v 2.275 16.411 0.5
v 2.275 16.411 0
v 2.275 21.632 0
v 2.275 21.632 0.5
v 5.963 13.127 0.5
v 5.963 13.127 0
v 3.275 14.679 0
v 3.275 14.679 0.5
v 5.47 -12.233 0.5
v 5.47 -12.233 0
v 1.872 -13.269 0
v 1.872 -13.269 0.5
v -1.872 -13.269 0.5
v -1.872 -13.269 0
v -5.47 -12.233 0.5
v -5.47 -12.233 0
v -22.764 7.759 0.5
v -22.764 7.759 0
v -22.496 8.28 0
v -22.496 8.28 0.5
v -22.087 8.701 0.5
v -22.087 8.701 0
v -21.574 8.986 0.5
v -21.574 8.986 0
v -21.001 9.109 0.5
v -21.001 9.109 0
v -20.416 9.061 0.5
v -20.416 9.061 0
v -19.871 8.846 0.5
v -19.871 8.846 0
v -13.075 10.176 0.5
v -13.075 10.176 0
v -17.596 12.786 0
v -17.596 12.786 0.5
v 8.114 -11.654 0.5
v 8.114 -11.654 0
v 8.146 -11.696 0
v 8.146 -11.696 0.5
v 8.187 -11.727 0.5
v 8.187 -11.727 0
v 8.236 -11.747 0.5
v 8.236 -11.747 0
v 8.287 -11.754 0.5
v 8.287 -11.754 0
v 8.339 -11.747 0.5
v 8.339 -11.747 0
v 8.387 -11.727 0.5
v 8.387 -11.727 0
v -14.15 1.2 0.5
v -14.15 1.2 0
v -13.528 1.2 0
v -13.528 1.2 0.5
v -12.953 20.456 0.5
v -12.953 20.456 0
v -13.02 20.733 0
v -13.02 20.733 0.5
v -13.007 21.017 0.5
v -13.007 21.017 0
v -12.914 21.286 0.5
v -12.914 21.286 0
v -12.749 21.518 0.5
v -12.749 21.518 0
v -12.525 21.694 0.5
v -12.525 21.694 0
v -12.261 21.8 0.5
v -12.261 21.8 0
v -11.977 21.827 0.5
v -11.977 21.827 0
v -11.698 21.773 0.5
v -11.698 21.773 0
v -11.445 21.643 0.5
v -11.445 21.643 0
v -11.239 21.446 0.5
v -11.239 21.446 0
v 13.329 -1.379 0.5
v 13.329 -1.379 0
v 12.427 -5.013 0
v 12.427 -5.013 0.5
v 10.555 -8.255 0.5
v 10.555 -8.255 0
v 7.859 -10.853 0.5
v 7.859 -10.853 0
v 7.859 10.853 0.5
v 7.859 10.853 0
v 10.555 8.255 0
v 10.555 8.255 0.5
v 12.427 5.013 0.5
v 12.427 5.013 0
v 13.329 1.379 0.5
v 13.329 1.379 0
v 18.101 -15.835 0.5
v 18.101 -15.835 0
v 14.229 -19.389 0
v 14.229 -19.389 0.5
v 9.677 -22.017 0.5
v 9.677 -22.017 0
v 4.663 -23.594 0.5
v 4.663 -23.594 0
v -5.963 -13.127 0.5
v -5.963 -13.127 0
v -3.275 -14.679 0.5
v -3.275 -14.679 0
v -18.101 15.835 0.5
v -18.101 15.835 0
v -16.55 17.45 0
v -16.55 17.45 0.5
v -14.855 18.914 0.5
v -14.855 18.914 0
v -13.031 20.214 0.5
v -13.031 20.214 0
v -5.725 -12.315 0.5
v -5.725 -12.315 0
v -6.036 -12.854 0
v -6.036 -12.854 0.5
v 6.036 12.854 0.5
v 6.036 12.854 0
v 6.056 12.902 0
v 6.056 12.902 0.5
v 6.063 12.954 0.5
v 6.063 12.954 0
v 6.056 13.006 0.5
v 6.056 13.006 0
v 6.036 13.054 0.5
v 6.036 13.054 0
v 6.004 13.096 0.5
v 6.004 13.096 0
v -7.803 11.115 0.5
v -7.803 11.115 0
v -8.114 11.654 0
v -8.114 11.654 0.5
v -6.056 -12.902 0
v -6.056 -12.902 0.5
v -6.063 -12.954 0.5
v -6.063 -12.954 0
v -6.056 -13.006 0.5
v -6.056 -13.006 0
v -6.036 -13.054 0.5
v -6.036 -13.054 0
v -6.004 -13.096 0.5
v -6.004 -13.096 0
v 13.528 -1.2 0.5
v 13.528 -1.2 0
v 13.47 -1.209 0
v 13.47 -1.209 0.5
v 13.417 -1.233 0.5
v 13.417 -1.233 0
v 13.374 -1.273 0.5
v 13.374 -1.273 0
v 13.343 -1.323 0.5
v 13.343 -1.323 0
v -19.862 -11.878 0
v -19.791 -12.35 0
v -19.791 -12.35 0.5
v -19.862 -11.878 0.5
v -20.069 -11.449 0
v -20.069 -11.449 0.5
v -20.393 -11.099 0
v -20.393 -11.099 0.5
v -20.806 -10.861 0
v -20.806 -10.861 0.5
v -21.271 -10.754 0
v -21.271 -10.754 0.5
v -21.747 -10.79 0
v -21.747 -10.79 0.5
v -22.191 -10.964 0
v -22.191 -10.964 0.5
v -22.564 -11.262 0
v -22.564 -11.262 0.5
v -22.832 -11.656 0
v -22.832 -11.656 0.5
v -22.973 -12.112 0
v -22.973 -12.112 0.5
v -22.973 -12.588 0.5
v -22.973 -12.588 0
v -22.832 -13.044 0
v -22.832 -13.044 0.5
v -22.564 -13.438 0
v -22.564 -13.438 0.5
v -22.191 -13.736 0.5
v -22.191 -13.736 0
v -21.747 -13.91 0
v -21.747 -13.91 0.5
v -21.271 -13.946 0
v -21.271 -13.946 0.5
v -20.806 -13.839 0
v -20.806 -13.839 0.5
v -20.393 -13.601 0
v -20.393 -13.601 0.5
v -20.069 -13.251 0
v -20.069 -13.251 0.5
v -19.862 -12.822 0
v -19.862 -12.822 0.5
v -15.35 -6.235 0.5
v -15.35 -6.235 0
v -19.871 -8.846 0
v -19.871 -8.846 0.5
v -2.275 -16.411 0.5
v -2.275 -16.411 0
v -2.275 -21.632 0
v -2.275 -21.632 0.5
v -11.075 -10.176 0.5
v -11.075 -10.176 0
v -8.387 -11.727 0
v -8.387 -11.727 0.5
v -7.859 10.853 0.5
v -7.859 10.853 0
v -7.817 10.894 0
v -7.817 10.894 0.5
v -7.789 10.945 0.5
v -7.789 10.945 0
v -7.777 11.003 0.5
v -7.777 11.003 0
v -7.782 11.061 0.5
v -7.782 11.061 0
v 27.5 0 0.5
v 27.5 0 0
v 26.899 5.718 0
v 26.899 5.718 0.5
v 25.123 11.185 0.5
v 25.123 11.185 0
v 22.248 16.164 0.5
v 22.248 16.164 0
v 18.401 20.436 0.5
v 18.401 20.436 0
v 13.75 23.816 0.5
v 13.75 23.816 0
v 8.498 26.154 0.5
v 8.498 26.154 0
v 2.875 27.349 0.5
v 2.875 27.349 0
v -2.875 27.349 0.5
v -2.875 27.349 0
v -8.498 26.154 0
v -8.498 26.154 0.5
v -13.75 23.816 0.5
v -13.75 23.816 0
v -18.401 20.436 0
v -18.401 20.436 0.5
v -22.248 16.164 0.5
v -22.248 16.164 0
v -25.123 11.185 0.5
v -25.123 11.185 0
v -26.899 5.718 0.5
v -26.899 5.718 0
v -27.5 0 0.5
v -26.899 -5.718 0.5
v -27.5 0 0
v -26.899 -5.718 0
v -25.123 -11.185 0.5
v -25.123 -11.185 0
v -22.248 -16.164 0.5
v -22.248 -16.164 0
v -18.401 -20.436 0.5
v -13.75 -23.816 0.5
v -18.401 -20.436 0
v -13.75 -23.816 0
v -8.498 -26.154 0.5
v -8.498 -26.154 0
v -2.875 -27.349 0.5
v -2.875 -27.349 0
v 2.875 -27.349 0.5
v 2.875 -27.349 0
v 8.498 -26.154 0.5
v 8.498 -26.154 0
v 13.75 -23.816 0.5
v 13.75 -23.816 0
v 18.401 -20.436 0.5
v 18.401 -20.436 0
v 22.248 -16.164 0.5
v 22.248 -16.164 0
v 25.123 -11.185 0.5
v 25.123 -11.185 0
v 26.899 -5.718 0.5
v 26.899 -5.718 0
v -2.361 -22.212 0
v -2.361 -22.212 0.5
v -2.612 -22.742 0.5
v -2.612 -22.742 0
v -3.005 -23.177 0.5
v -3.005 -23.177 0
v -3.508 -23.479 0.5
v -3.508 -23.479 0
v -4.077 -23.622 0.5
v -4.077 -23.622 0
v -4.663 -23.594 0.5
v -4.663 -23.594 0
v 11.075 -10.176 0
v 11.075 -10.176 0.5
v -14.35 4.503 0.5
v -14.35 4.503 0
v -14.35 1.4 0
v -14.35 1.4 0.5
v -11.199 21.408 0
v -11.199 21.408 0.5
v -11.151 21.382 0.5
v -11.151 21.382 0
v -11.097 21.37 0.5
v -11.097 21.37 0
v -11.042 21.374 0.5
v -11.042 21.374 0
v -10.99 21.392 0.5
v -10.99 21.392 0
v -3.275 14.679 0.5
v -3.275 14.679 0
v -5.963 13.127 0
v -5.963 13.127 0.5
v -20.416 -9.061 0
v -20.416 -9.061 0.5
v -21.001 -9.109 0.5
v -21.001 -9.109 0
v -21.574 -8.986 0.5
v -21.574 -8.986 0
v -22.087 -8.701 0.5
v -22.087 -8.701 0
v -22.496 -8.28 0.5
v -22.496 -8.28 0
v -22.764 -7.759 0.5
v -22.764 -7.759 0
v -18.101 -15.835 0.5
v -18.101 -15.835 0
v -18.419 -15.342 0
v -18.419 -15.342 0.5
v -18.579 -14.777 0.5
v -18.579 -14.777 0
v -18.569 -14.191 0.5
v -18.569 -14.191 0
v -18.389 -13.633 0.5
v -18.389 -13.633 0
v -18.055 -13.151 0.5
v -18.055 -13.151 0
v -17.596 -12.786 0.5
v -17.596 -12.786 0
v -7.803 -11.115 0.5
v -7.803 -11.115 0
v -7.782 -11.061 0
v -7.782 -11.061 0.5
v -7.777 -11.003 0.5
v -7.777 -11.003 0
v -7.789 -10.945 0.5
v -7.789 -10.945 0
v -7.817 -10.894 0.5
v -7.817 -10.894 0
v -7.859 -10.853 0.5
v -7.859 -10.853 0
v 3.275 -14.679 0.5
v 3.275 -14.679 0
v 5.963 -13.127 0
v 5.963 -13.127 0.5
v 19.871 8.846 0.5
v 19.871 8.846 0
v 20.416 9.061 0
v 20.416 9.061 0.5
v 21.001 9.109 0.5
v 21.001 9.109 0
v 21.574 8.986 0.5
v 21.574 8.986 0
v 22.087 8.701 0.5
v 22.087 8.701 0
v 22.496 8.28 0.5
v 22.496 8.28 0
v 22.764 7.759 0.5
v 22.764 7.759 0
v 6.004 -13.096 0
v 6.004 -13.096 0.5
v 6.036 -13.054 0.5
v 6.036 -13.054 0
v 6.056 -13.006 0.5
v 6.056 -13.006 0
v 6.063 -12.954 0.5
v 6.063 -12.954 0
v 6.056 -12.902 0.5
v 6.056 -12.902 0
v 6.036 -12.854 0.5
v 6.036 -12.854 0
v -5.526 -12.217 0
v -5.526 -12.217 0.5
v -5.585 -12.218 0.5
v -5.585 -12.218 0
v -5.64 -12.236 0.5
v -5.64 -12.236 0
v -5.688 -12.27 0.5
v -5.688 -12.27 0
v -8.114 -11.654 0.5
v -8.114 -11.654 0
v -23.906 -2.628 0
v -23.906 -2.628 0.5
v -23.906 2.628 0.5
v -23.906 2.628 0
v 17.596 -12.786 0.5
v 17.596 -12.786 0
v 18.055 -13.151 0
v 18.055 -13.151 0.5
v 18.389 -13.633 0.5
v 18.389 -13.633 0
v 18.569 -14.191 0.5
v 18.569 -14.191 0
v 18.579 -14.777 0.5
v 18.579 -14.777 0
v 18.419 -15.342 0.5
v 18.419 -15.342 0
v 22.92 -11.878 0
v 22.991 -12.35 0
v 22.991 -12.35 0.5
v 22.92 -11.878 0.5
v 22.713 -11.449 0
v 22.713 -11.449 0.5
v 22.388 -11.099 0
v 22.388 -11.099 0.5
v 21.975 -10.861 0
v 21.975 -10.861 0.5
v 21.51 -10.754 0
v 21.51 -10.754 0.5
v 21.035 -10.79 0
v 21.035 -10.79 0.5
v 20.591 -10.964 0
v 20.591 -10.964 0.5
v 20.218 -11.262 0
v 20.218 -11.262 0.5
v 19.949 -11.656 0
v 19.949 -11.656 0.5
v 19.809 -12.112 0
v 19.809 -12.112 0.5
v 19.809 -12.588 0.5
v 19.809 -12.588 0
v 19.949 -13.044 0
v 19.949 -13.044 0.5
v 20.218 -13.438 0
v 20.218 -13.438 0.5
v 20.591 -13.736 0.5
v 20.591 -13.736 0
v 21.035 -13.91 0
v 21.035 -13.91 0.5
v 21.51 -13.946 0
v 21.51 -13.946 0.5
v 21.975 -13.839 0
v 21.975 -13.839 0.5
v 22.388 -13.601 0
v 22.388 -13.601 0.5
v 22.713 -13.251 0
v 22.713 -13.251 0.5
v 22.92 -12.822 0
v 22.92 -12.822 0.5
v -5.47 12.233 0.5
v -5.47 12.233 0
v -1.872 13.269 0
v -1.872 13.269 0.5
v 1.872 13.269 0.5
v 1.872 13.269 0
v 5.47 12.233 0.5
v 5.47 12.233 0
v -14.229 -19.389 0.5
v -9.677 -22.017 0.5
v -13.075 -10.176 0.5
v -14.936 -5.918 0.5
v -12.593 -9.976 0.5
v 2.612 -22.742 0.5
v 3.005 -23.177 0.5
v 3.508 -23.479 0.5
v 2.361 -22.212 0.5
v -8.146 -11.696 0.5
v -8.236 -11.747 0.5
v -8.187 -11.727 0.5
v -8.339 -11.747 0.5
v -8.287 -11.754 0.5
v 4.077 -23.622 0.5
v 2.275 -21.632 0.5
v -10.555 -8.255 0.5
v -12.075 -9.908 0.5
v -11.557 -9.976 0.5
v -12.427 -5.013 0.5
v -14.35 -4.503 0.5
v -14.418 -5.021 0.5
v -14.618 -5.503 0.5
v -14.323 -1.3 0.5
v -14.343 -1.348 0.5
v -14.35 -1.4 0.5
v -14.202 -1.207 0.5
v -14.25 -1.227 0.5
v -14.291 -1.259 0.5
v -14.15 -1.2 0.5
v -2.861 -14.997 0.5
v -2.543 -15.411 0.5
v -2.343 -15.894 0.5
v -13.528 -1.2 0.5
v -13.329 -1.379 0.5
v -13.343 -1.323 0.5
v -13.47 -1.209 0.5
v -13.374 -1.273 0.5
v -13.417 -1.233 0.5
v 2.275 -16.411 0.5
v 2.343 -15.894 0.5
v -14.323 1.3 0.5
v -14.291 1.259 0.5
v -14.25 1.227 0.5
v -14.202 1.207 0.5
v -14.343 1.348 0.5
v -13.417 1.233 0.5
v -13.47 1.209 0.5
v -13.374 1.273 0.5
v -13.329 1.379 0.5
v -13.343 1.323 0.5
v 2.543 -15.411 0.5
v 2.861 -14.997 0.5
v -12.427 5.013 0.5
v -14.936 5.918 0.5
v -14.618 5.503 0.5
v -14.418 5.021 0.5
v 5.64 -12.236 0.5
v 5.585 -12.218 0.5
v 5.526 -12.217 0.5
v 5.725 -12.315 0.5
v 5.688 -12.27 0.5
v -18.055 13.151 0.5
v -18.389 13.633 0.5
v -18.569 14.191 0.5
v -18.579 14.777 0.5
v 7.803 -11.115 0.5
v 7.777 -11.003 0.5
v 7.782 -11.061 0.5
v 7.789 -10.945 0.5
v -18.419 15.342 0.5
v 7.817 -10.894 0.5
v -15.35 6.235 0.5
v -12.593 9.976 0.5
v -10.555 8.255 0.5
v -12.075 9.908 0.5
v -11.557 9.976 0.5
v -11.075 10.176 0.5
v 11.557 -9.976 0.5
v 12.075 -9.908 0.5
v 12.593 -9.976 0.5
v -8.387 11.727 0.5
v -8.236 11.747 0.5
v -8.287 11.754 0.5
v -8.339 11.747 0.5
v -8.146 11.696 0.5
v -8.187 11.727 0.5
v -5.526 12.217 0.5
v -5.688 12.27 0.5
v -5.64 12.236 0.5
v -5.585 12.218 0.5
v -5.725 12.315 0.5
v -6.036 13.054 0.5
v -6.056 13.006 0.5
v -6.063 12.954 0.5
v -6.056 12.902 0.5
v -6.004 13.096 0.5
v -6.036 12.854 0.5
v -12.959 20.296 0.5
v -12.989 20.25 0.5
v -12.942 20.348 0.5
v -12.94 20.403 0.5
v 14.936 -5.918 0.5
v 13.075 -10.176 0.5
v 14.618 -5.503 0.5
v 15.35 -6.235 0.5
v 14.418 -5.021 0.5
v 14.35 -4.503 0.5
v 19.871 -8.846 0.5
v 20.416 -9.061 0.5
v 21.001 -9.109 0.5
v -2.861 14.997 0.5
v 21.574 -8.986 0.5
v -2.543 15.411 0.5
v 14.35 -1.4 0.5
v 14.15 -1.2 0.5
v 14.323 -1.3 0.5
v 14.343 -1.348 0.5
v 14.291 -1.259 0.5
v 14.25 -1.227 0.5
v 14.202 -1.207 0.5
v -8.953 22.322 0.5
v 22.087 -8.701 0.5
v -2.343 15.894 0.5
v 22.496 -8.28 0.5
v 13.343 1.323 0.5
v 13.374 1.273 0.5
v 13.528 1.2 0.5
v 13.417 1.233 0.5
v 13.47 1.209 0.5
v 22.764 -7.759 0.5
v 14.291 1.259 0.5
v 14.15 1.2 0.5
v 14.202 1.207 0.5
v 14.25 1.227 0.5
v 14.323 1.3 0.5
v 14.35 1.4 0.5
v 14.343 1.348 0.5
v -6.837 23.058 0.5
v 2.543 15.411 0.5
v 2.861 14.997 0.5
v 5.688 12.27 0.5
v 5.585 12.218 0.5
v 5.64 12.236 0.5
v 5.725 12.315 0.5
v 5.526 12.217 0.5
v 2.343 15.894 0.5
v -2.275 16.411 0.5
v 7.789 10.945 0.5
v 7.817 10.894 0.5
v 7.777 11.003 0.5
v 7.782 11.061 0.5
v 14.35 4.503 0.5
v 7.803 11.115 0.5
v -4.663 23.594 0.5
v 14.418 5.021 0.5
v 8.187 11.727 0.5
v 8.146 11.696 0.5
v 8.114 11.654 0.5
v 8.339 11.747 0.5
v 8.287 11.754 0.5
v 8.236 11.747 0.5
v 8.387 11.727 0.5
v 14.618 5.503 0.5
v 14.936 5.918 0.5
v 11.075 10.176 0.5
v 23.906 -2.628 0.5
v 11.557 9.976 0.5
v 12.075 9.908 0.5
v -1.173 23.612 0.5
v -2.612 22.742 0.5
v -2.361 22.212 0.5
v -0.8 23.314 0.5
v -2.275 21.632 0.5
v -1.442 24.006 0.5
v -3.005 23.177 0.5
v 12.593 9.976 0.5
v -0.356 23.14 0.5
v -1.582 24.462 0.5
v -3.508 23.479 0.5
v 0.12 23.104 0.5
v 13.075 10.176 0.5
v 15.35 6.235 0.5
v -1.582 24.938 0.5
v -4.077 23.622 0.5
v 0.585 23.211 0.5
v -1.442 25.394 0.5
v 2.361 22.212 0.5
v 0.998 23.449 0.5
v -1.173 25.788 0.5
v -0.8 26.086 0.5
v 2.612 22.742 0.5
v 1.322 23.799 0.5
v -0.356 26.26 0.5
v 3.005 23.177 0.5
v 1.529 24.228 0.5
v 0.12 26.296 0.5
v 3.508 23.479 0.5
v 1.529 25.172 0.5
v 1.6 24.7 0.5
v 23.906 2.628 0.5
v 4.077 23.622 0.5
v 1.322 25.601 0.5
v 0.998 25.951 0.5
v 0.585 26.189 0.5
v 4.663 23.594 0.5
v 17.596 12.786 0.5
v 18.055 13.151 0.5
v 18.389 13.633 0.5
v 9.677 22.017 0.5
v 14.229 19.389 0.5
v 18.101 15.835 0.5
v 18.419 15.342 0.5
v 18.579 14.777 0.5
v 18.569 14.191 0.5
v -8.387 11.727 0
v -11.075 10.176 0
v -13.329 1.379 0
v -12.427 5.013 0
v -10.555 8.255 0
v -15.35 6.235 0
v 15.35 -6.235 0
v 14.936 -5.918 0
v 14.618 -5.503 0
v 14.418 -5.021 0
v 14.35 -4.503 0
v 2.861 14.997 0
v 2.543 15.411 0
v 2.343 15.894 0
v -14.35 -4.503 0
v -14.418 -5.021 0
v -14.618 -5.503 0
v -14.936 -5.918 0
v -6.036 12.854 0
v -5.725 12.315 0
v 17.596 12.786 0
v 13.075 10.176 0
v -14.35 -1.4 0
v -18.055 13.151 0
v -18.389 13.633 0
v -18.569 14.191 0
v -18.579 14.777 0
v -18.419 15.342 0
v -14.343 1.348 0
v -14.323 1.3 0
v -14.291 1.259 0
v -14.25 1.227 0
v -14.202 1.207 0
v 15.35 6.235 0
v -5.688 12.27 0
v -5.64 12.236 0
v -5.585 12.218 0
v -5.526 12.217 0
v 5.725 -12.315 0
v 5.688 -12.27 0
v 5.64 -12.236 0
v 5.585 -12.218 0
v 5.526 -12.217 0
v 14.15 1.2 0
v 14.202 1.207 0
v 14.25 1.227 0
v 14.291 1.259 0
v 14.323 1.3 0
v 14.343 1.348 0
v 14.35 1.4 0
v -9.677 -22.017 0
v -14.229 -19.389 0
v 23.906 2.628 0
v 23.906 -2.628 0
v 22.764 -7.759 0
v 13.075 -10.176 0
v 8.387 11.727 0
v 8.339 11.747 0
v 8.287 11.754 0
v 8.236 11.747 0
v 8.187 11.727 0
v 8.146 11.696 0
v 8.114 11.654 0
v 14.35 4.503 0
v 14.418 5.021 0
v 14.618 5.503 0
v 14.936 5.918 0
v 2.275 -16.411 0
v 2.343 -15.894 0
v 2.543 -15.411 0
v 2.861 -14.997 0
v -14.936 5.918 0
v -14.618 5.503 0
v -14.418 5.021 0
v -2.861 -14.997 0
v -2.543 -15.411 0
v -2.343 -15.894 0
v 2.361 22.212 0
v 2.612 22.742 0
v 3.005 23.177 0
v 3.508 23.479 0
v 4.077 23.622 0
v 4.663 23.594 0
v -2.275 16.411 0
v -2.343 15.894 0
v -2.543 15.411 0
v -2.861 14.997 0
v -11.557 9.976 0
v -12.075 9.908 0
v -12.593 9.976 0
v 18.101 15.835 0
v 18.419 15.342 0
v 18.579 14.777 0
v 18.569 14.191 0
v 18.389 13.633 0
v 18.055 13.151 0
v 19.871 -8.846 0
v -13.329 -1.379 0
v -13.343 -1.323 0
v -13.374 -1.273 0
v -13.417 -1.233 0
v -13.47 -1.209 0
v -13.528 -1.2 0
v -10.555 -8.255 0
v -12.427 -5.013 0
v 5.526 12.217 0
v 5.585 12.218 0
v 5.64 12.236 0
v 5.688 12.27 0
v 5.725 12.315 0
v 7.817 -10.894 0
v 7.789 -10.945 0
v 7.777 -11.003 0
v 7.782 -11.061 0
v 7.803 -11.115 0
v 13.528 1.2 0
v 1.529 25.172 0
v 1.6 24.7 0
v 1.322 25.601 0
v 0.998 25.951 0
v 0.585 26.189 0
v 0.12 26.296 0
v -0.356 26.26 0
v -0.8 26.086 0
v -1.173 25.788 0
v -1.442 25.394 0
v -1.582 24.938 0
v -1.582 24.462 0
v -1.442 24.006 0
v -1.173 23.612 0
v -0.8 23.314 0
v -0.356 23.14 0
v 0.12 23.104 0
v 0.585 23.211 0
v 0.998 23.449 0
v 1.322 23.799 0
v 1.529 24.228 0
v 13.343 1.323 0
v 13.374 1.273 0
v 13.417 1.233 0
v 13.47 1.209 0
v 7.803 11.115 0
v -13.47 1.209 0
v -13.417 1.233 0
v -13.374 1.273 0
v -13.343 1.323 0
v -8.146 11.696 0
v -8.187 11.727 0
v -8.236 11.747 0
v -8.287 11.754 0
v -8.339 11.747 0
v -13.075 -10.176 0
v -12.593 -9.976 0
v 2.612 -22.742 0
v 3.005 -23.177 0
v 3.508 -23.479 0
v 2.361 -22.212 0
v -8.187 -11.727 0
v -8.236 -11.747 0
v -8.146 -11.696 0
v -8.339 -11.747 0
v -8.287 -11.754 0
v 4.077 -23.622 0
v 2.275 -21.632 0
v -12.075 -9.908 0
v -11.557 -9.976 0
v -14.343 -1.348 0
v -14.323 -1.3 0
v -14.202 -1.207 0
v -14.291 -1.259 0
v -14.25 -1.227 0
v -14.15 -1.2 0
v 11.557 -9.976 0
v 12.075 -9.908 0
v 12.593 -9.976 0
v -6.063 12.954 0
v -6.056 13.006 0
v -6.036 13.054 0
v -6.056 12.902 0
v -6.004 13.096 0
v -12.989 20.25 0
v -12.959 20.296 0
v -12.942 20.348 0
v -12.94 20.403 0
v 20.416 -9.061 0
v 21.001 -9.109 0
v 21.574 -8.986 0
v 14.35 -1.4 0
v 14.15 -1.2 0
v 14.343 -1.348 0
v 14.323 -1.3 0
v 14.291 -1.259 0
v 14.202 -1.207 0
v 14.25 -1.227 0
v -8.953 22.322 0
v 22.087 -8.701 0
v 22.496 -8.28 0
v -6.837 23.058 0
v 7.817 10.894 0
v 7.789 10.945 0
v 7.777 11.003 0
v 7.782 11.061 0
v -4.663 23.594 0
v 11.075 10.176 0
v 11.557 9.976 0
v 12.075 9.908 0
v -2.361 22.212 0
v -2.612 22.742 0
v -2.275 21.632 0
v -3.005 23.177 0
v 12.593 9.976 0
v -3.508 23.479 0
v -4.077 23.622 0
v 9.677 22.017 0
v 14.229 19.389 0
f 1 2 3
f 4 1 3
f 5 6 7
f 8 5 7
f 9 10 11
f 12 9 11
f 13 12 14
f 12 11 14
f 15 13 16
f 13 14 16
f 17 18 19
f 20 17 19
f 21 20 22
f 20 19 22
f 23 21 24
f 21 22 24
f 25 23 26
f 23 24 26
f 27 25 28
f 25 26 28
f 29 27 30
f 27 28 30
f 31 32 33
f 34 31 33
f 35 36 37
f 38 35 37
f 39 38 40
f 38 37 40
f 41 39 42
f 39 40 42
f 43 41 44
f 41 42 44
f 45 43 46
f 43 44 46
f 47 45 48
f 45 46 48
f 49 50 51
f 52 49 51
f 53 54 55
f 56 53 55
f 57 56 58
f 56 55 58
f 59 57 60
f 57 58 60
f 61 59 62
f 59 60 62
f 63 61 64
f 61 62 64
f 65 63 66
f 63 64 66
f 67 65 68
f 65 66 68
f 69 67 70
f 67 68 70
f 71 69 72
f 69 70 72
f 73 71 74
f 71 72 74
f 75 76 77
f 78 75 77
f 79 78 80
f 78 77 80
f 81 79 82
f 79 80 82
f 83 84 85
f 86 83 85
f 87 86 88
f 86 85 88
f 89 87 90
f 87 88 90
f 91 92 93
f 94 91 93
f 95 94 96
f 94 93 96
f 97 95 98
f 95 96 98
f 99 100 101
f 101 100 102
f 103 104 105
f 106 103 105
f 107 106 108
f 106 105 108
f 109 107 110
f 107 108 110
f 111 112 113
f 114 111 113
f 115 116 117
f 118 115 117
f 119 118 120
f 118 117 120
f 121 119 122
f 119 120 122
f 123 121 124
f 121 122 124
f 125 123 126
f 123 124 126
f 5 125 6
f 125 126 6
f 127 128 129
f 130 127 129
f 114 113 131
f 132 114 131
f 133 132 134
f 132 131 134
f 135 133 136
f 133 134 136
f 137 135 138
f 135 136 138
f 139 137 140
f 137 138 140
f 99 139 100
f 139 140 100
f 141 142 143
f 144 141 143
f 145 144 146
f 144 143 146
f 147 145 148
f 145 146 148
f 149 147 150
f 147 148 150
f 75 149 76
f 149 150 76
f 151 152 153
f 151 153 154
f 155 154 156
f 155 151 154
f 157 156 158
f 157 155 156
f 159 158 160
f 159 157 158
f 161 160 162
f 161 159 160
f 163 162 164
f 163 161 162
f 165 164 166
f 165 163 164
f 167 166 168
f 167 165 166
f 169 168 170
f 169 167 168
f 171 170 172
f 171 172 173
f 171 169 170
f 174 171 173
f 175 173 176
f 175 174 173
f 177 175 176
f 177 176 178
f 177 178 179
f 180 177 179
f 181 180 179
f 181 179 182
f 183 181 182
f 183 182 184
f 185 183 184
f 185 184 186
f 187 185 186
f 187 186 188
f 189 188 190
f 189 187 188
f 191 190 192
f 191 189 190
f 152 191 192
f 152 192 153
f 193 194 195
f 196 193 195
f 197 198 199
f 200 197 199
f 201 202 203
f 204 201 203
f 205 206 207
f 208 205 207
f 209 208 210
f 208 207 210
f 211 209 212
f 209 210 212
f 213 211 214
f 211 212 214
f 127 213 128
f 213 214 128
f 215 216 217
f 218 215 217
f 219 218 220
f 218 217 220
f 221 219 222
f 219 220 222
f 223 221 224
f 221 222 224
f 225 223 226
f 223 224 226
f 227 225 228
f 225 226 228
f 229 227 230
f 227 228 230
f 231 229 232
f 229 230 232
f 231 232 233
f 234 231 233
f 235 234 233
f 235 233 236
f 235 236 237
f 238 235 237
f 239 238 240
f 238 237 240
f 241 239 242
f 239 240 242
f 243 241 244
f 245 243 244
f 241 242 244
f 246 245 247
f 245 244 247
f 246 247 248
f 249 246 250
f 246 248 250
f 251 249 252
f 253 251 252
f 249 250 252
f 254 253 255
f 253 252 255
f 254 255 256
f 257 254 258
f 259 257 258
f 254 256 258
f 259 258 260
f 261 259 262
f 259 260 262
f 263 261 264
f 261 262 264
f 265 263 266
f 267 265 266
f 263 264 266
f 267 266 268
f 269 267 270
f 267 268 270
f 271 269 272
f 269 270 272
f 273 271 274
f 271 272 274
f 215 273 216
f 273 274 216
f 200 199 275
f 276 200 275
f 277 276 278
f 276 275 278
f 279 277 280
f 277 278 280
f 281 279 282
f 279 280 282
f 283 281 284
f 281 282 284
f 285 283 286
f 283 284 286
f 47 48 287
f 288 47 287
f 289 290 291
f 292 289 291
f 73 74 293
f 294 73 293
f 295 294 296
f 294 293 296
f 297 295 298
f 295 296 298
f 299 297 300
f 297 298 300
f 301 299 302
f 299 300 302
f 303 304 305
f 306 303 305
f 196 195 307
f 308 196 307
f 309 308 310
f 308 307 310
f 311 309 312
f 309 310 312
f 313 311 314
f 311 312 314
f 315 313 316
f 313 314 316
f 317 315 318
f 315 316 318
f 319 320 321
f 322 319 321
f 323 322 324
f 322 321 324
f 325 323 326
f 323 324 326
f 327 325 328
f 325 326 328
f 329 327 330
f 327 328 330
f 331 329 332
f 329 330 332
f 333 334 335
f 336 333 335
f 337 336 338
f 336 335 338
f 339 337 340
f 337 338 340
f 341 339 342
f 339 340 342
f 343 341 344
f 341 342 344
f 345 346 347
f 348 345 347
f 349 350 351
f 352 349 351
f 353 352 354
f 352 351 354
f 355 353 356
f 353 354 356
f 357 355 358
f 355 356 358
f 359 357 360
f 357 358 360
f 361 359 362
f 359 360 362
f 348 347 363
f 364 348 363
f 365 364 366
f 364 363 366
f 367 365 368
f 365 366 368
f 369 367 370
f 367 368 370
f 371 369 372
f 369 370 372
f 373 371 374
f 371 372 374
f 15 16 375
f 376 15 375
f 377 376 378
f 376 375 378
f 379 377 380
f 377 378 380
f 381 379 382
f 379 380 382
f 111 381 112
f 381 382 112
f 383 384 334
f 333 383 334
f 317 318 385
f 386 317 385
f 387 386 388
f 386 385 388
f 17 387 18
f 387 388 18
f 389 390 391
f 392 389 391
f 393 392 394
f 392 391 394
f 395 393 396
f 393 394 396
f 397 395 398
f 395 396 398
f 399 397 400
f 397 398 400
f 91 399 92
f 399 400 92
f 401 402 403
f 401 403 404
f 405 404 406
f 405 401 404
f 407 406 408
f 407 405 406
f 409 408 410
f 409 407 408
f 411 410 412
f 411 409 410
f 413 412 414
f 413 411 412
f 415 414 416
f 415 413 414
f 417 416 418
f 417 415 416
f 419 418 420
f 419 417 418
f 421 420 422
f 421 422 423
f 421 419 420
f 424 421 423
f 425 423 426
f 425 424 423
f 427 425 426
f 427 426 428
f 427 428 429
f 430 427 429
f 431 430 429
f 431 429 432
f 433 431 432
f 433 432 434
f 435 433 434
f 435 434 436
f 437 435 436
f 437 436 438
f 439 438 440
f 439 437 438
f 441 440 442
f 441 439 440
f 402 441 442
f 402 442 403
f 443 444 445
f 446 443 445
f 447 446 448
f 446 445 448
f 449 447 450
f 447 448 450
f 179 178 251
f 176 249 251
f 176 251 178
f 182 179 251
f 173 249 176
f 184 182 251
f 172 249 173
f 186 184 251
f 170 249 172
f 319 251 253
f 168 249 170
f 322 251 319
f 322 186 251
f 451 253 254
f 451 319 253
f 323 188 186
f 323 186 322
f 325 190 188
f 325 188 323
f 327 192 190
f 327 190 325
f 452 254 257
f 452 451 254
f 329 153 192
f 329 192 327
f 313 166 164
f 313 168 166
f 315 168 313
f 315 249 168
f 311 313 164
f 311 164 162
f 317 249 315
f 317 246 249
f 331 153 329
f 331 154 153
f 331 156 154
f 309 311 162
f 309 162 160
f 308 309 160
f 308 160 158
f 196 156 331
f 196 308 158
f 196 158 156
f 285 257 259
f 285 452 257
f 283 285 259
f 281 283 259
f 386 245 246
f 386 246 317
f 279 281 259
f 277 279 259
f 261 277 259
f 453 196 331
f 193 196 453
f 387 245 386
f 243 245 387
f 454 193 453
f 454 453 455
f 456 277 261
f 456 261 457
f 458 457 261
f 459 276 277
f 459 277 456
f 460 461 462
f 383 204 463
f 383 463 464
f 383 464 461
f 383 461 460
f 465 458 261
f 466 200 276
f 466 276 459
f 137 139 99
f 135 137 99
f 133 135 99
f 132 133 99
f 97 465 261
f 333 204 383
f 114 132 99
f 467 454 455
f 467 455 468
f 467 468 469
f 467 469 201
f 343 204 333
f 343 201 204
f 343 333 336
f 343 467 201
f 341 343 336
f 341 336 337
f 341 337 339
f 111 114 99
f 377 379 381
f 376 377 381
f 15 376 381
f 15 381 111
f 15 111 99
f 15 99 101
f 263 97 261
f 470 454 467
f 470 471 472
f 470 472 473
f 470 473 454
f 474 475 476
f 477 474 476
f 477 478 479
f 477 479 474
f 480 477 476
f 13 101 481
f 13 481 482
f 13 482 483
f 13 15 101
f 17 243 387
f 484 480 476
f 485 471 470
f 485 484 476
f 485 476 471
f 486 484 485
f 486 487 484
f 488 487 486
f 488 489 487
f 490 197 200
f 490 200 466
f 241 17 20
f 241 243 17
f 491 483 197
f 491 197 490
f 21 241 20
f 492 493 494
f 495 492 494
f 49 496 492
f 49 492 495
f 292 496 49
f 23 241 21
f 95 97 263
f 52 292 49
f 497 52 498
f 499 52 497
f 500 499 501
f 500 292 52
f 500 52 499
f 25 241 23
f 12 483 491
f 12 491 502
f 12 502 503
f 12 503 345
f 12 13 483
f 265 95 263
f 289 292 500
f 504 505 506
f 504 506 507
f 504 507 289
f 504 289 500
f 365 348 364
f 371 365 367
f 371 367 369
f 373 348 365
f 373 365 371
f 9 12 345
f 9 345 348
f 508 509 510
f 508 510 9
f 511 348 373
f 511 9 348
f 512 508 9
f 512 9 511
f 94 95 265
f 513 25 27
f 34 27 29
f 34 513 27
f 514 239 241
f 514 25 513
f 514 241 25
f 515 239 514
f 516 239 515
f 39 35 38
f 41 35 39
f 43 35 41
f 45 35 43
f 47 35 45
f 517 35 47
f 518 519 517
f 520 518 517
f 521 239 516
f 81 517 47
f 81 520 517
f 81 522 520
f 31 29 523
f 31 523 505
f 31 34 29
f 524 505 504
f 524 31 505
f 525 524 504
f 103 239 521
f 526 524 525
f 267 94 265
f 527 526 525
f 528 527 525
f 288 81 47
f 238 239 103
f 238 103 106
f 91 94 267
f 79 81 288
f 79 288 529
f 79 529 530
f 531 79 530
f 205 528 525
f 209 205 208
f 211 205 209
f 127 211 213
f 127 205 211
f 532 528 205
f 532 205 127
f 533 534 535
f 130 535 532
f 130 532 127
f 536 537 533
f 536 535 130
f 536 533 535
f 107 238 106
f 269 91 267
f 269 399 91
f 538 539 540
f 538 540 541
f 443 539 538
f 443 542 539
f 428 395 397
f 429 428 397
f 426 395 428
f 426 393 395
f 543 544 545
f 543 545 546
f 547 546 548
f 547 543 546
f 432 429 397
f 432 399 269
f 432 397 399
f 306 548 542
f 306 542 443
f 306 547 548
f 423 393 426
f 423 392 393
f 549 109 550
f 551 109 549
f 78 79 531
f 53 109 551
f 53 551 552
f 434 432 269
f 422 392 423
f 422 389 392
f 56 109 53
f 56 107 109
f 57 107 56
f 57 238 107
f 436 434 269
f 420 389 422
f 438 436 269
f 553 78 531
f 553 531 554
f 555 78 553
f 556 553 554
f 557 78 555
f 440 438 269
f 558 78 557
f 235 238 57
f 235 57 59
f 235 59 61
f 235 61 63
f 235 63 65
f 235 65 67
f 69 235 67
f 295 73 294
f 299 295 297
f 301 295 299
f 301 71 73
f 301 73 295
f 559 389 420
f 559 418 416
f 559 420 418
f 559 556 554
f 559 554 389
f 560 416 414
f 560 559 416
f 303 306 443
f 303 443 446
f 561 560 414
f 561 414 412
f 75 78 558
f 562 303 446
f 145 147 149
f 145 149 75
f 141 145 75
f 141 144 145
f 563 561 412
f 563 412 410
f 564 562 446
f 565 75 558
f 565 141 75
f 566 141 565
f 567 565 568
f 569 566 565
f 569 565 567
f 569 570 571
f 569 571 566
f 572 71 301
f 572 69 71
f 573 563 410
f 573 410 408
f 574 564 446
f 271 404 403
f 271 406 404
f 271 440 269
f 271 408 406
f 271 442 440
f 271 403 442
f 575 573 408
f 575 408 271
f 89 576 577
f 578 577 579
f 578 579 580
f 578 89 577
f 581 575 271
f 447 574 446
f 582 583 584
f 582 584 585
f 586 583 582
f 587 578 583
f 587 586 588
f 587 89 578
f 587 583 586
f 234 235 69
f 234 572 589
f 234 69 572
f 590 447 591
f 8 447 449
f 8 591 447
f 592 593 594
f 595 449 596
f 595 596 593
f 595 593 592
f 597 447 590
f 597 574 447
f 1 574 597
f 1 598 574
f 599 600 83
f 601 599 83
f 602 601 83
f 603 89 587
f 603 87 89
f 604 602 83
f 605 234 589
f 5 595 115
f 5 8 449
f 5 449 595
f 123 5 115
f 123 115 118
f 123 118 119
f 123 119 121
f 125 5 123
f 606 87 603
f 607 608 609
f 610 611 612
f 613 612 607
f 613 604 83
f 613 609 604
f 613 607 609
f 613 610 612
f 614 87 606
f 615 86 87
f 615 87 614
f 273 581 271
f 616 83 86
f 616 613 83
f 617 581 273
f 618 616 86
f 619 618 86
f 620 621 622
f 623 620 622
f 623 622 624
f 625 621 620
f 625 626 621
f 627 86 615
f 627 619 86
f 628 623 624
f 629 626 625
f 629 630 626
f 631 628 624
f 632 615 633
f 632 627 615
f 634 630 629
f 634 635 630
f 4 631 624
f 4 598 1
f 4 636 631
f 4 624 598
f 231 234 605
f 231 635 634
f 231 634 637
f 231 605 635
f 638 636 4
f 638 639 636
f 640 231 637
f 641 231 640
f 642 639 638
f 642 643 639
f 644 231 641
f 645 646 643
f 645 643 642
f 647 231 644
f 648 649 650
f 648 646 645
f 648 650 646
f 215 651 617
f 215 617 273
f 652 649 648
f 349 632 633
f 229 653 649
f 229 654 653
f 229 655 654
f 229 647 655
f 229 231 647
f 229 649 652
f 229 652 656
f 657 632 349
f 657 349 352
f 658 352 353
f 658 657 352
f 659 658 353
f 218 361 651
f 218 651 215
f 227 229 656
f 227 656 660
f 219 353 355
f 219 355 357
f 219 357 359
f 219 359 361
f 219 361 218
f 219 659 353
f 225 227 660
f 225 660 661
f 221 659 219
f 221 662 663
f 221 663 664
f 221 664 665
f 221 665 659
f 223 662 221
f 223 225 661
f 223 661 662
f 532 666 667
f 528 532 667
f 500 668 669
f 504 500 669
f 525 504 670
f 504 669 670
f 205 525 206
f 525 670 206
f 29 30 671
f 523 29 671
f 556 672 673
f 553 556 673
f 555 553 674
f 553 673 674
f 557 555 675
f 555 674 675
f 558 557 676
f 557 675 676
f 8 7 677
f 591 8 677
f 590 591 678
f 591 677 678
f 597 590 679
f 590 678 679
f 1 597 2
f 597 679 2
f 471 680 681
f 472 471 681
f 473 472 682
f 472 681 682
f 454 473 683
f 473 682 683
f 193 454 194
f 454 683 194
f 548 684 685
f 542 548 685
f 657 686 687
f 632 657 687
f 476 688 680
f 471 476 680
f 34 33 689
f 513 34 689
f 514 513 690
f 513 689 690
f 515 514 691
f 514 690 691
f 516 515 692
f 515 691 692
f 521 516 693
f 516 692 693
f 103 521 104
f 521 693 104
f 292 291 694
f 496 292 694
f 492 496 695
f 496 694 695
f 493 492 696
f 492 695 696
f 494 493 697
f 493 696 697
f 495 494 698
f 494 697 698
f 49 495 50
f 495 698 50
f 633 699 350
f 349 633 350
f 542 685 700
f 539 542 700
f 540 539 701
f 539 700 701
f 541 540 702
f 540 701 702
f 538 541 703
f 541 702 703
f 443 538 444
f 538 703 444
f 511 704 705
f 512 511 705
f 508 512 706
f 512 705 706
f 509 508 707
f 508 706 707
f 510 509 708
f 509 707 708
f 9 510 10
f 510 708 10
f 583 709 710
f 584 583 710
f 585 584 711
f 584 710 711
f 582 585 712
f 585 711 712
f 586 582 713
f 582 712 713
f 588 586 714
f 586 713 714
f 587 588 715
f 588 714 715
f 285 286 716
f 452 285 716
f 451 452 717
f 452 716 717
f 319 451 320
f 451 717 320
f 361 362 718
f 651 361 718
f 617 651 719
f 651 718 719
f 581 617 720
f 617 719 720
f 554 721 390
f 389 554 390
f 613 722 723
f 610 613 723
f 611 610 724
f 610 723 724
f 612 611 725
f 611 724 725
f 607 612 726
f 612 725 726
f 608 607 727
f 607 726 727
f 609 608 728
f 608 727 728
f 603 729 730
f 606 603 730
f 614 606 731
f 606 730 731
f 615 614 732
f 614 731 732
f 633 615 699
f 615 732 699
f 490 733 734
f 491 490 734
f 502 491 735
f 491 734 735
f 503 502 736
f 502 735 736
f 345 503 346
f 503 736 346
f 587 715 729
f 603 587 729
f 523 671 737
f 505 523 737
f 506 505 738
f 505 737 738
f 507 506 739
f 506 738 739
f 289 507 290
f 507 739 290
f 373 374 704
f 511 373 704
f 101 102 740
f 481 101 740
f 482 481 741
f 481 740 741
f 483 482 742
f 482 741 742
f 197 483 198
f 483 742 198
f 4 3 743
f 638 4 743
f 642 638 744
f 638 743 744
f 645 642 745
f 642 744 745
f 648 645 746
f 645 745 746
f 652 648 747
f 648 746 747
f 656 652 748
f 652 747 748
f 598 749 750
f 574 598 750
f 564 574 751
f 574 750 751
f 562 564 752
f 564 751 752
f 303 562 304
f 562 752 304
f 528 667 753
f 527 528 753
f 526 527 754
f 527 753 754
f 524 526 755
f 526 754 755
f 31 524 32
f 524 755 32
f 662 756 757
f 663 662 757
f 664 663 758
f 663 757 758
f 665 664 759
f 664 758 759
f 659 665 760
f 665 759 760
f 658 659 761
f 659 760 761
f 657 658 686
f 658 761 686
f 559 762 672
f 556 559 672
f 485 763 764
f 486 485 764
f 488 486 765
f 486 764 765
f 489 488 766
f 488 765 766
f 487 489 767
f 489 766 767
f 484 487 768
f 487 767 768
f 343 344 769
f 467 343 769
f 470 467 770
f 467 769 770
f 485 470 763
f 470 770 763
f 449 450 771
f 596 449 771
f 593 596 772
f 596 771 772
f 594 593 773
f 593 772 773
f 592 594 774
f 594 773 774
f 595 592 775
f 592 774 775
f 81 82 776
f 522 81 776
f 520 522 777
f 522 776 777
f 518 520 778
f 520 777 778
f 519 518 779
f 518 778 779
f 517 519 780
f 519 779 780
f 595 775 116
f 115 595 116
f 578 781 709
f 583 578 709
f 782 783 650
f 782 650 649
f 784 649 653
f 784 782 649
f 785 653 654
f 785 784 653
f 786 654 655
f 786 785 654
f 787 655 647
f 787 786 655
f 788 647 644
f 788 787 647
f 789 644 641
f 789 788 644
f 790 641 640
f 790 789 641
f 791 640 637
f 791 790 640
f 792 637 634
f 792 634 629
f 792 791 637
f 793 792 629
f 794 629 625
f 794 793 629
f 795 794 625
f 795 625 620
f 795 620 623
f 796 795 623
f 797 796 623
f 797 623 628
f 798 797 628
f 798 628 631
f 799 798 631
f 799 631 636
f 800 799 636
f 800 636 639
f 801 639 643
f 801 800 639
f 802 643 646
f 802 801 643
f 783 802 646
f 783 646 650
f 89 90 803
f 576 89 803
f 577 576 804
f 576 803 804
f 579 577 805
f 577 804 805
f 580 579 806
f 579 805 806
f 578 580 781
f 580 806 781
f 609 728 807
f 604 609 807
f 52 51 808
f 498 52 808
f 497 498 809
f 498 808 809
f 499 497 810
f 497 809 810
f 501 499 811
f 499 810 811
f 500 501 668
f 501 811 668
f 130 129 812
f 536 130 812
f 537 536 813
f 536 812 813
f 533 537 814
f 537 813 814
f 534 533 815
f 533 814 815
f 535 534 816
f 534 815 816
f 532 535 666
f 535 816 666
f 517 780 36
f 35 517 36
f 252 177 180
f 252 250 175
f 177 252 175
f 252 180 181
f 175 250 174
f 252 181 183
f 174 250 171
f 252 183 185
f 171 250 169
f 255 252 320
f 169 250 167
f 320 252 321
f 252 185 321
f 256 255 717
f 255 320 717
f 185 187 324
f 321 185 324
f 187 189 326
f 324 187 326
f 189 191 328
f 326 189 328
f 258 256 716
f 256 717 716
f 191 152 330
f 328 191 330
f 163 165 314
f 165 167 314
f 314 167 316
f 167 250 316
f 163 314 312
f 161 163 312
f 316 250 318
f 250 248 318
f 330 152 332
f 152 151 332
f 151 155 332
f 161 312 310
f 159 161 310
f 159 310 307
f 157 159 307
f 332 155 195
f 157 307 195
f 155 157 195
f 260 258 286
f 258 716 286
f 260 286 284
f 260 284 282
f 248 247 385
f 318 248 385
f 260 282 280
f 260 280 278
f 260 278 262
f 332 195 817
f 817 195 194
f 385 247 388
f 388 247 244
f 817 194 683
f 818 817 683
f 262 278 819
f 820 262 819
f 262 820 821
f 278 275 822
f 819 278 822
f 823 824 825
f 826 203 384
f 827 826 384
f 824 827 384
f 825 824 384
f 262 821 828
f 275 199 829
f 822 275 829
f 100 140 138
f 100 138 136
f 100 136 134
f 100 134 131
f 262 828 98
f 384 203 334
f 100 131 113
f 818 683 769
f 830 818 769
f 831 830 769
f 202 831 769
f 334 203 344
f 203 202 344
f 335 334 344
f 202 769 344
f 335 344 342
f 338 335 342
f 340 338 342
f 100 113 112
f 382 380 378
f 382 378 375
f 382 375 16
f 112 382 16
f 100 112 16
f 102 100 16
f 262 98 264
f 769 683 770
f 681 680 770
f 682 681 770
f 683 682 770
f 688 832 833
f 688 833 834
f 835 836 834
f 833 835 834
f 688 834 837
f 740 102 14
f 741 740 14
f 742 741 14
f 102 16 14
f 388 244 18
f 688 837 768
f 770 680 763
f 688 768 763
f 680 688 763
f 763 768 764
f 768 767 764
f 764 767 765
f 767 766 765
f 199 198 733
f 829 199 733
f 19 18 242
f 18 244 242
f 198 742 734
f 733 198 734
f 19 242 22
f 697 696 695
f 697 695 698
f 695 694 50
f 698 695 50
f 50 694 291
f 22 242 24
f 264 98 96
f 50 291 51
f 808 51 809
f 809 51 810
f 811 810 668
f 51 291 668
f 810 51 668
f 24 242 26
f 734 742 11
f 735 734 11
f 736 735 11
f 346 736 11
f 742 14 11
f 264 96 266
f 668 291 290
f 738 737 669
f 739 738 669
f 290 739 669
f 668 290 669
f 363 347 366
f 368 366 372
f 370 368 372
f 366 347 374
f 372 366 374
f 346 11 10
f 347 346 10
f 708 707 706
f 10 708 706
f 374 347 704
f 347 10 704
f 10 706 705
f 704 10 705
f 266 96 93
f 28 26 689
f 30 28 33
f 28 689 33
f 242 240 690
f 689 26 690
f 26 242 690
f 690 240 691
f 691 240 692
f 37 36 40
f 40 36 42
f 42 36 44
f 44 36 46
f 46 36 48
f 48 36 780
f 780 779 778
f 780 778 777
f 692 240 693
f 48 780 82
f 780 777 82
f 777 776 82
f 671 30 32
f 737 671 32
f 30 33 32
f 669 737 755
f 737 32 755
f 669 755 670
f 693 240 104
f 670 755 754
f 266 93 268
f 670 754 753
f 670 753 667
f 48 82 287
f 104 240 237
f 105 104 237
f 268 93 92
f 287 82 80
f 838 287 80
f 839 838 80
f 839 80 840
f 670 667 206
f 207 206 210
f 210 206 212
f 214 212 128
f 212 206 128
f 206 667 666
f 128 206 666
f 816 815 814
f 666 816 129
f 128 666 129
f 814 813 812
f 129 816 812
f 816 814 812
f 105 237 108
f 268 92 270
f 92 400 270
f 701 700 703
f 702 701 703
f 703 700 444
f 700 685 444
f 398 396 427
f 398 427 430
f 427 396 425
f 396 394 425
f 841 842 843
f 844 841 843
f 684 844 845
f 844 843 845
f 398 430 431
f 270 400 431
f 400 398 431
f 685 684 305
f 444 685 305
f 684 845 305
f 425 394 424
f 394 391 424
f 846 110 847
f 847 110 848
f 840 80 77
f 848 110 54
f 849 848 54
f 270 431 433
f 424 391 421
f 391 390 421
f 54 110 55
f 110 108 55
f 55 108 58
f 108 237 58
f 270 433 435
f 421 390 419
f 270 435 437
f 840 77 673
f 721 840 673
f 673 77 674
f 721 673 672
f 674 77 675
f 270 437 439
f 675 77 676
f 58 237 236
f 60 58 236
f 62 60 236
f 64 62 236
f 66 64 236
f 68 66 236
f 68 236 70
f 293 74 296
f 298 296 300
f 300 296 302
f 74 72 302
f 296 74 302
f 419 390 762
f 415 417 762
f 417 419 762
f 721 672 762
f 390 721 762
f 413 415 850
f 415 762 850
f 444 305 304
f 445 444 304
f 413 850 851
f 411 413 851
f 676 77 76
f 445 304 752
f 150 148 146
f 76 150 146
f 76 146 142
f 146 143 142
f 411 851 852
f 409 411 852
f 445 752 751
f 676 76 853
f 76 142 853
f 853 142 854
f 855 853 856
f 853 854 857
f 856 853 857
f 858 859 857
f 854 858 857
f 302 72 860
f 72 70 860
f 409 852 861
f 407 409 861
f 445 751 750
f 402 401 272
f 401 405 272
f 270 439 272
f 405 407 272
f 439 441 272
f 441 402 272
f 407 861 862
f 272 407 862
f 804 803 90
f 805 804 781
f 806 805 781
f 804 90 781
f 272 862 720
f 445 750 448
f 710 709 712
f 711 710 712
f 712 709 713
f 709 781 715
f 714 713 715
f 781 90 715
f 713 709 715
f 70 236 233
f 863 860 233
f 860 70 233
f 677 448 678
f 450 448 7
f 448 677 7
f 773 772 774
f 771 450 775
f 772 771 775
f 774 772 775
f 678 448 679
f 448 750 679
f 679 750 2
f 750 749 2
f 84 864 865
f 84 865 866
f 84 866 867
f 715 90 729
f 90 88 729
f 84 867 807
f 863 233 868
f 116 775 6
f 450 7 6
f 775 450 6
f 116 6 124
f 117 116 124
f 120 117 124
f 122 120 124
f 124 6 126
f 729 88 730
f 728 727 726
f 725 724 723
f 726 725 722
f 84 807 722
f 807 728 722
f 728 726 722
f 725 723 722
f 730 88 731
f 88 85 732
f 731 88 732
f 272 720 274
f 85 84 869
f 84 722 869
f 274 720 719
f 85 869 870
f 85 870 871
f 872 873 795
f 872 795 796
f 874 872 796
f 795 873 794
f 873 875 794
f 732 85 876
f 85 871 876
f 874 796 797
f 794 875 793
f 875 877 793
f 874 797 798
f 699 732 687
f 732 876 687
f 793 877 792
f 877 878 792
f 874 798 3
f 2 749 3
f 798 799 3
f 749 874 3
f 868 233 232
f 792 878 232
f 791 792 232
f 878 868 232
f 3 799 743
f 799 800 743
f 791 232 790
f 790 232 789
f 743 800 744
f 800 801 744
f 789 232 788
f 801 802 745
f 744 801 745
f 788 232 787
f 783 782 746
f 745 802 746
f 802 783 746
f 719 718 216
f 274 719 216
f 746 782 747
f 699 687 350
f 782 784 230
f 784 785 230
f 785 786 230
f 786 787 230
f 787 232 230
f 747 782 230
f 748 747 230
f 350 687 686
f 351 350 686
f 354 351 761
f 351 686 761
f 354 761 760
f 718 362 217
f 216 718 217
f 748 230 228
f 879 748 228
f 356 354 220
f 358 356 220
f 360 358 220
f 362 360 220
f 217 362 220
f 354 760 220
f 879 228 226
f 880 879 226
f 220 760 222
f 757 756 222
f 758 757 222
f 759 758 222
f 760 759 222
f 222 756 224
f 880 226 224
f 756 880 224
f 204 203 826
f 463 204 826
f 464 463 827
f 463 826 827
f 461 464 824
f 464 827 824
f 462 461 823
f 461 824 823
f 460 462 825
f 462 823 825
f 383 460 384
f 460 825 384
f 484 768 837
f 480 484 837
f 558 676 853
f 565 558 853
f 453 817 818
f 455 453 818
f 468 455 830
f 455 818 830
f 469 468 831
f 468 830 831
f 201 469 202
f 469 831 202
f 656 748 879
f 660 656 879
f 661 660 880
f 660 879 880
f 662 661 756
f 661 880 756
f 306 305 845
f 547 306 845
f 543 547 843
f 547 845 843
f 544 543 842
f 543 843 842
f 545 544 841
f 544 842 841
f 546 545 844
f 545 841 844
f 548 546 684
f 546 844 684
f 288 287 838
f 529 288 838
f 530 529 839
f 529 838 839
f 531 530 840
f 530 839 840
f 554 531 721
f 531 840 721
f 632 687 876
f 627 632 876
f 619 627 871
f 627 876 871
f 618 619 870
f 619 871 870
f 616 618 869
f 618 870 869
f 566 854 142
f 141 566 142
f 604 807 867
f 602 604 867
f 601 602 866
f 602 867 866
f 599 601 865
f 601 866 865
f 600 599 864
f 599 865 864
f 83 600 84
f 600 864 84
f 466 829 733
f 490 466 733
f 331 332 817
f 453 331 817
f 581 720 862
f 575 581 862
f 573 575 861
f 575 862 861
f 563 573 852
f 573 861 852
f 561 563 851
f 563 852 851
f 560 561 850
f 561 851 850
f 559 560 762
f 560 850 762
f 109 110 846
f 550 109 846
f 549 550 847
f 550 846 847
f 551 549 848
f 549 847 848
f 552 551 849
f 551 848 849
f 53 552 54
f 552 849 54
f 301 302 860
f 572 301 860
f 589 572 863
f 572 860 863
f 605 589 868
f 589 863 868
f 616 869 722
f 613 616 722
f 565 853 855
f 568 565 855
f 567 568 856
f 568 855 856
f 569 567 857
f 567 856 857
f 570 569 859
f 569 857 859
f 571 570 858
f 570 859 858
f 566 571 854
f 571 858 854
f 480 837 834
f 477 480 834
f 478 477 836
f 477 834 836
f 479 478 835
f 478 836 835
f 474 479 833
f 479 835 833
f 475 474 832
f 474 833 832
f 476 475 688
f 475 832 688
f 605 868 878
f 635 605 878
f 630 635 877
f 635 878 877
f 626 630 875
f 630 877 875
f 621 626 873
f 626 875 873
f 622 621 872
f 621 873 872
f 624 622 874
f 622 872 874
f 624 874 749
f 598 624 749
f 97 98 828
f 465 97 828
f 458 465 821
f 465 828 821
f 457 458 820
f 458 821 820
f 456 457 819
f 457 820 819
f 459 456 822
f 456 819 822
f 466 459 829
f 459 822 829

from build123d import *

# Parameters (mm, degrees)
IZIM1_R                     = 27.5
IZIM1_R_2                   = 1.6
Y_KSEKLIK_EKSTR_ZYON1_DEPTH = 0.5


with BuildPart() as part:
    # Çizim1 → Yükseklik-Ekstrüzyon1 (new body)
    with BuildSketch(Plane.XY):
        Circle(IZIM1_R)
        with Locations((0, 24.7)):
            Circle(IZIM1_R_2, mode=Mode.SUBTRACT)
        with Locations((21.390827473, -12.35)):
            Circle(IZIM1_R_2, mode=Mode.SUBTRACT)
        with Locations((-21.390827473, -12.35)):
            Circle(IZIM1_R_2, mode=Mode.SUBTRACT)
        with BuildLine():
            Line((5.962564435, 13.127464544), (3.275, 14.679130594))
            ThreePointArc((3.275, 14.679130594), (2.542949192, 15.411181402), (2.275, 16.411181402))
            Line((2.275, 16.411181402), (2.275, 21.631617485))
            ThreePointArc((2.275, 21.631617485), (3.00525794, 23.176853746), (4.662755102, 23.593668957))
            ThreePointArc((4.662755102, 23.593668957), (12.025, 20.827910961), (18.101339134, 15.834898849))
            ThreePointArc((18.101339134, 15.834898849), (18.569115153, 14.191056594), (17.596030267, 12.786016536))
            Line((17.596030267, 12.786016536), (13.075, 10.175798494))
            ThreePointArc((13.075, 10.175798494), (12.075, 9.907849302), (11.075, 10.175798494))
            Line((11.075, 10.175798494), (8.387435565, 11.727464544))
            ThreePointArc((8.387435565, 11.727464544), (8.235671756, 11.747444629), (8.114230485, 11.654259464))
            Line((8.114230485, 11.654259464), (7.803105114, 11.115374514))
            ThreePointArc((7.803105114, 11.115374514), (7.780713917, 10.973636087), (7.859011515, 10.853383712))
            ThreePointArc((7.859011515, 10.853383712), (11.604740669, 6.699999553), (13.328811876, 1.379410738))
            ThreePointArc((13.328811876, 1.379410738), (13.393804684, 1.251476831), (13.527749366, 1.199998958))
            Line((13.527749366, 1.199998958), (14.15, 1.199998958))
            ThreePointArc((14.15, 1.199998958), (14.291421356, 1.258577601), (14.35, 1.399998958))
            Line((14.35, 1.399998958), (14.35, 4.5033321))
            ThreePointArc((14.35, 4.5033321), (14.617949192, 5.5033321), (15.35, 6.235382907))
            Line((15.35, 6.235382907), (19.871030267, 8.845600949))
            ThreePointArc((19.871030267, 8.845600949), (21.574373094, 8.985797151), (22.764094236, 7.758770109))
            ThreePointArc((22.764094236, 7.758770109), (24.05, 0), (22.764094236, -7.758770109))
            ThreePointArc((22.764094236, -7.758770109), (21.574373094, -8.985797151), (19.871030267, -8.845600949))
            Line((19.871030267, -8.845600949), (15.35, -6.235382907))
            ThreePointArc((15.35, -6.235382907), (14.617949192, -5.5033321), (14.35, -4.5033321))
            Line((14.35, -4.5033321), (14.35, -1.400001042))
            ThreePointArc((14.35, -1.400001042), (14.291421356, -1.258579686), (14.15, -1.200001042))
            Line((14.15, -1.200001042), (13.527749151, -1.200001042))
            ThreePointArc((13.527749151, -1.200001042), (13.393804479, -1.251478906), (13.328811663, -1.379412792))
            ThreePointArc((13.328811663, -1.379412792), (11.604739636, -6.700001341), (7.859009843, -10.853384923))
            ThreePointArc((7.859009843, -10.853384923), (7.780712223, -10.973637301), (7.803103416, -11.115375743))
            Line((7.803103416, -11.115375743), (8.114228679, -11.654260506))
            ThreePointArc((8.114228679, -11.654260506), (8.235669951, -11.747445671), (8.38743376, -11.727465587))
            Line((8.38743376, -11.727465587), (11.075, -10.175798494))
            ThreePointArc((11.075, -10.175798494), (12.075, -9.907849302), (13.075, -10.175798494))
            Line((13.075, -10.175798494), (17.596030267, -12.786016536))
            ThreePointArc((17.596030267, -12.786016536), (18.569115153, -14.191056594), (18.101339134, -15.834898849))
            ThreePointArc((18.101339134, -15.834898849), (12.025, -20.827910961), (4.662755102, -23.593668957))
            ThreePointArc((4.662755102, -23.593668957), (3.00525794, -23.176853746), (2.275, -21.631617485))
            Line((2.275, -21.631617485), (2.275, -16.411181402))
            ThreePointArc((2.275, -16.411181402), (2.542949192, -15.411181402), (3.275, -14.679130594))
            Line((3.275, -14.679130594), (5.962562629, -13.127465587))
            ThreePointArc((5.962562629, -13.127465587), (6.055747795, -13.006024315), (6.03576771, -12.854260506))
            Line((6.03576771, -12.854260506), (5.724642232, -12.315375369))
            ThreePointArc((5.724642232, -12.315375369), (5.613088766, -12.225114815), (5.469798369, -12.23279632))
            ThreePointArc((5.469798369, -12.23279632), (-2.065e-06, -13.4), (-5.469802139, -12.232794634))
            ThreePointArc((-5.469802139, -12.232794634), (-5.613092563, -12.225113095), (-5.724646058, -12.315373658))
            Line((-5.724646058, -12.315373658), (-6.035771321, -12.854258421))
            ThreePointArc((-6.035771321, -12.854258421), (-6.055751405, -13.00602223), (-5.96256624, -13.127463502))
            Line((-5.96256624, -13.127463502), (-3.275, -14.679130594))
            ThreePointArc((-3.275, -14.679130594), (-2.542949192, -15.411181402), (-2.275, -16.411181402))
            Line((-2.275, -16.411181402), (-2.275, -21.631617485))
            ThreePointArc((-2.275, -21.631617485), (-3.00525794, -23.176853746), (-4.662755102, -23.593668957))
            ThreePointArc((-4.662755102, -23.593668957), (-12.025, -20.827910961), (-18.101339134, -15.834898849))
            ThreePointArc((-18.101339134, -15.834898849), (-18.569115153, -14.191056594), (-17.596030267, -12.786016536))
            Line((-17.596030267, -12.786016536), (-13.075, -10.175798494))
            ThreePointArc((-13.075, -10.175798494), (-12.075, -9.907849302), (-11.075, -10.175798494))
            Line((-11.075, -10.175798494), (-8.387437371, -11.727463502))
            ThreePointArc((-8.387437371, -11.727463502), (-8.235673562, -11.747443587), (-8.11423229, -11.654258421))
            Line((-8.11423229, -11.654258421), (-7.803106811, -11.115373285))
            ThreePointArc((-7.803106811, -11.115373285), (-7.780715611, -10.973634873), (-7.859013188, -10.853382501))
            ThreePointArc((-7.859013188, -10.853382501), (-11.604741185, -6.699998659), (-13.328811876, -1.379410738))
            ThreePointArc((-13.328811876, -1.379410738), (-13.393804684, -1.251476831), (-13.527749366, -1.199998958))
            Line((-13.527749366, -1.199998958), (-14.15, -1.199998958))
            ThreePointArc((-14.15, -1.199998958), (-14.291421356, -1.258577601), (-14.35, -1.399998958))
            Line((-14.35, -1.399998958), (-14.35, -4.5033321))
            ThreePointArc((-14.35, -4.5033321), (-14.617949192, -5.5033321), (-15.35, -6.235382907))
            Line((-15.35, -6.235382907), (-19.871030267, -8.845600949))
            ThreePointArc((-19.871030267, -8.845600949), (-21.574373094, -8.985797151), (-22.764094236, -7.758770109))
            ThreePointArc((-22.764094236, -7.758770109), (-24.05, 0), (-22.764094236, 7.758770109))
            ThreePointArc((-22.764094236, 7.758770109), (-21.574373094, 8.985797151), (-19.871030267, 8.845600949))
            Line((-19.871030267, 8.845600949), (-15.35, 6.235382907))
            ThreePointArc((-15.35, 6.235382907), (-14.617949192, 5.5033321), (-14.35, 4.5033321))
            Line((-14.35, 4.5033321), (-14.35, 1.400001042))
            ThreePointArc((-14.35, 1.400001042), (-14.291421356, 1.258579686), (-14.15, 1.200001042))
            Line((-14.15, 1.200001042), (-13.527749151, 1.200001042))
            ThreePointArc((-13.527749151, 1.200001042), (-13.393804479, 1.251478906), (-13.328811663, 1.379412792))
            ThreePointArc((-13.328811663, 1.379412792), (-11.604740153, 6.700000447), (-7.859011515, 10.853383712))
            ThreePointArc((-7.859011515, 10.853383712), (-7.780713917, 10.973636087), (-7.803105114, 11.115374514))
            Line((-7.803105114, 11.115374514), (-8.114230485, 11.654259464))
            ThreePointArc((-8.114230485, 11.654259464), (-8.235671756, 11.747444629), (-8.387435565, 11.727464544))
            Line((-8.387435565, 11.727464544), (-11.075, 10.175798494))
            ThreePointArc((-11.075, 10.175798494), (-12.075, 9.907849302), (-13.075, 10.175798494))
            Line((-13.075, 10.175798494), (-17.596030267, 12.786016536))
            ThreePointArc((-17.596030267, 12.786016536), (-18.569115153, 14.191056594), (-18.101339134, 15.834898849))
            ThreePointArc((-18.101339134, 15.834898849), (-15.719264288, 18.201846891), (-13.030721544, 20.213925795))
            ThreePointArc((-13.030721544, 20.213925795), (-12.948542196, 20.32125171), (-12.953404277, 20.456339302))
            ThreePointArc((-12.953404277, 20.456339302), (-12.525, 21.693936365), (-11.239007365, 21.44614682))
            ThreePointArc((-11.239007365, 21.44614682), (-11.12444912, 21.374392338), (-10.990412477, 21.391898784))
            ThreePointArc((-10.990412477, 21.391898784), (-7.903629659, 22.714205648), (-4.662755102, 23.593668957))
            ThreePointArc((-4.662755102, 23.593668957), (-3.00525794, 23.176853746), (-2.275, 21.631617485))
            Line((-2.275, 21.631617485), (-2.275, 16.411181402))
            ThreePointArc((-2.275, 16.411181402), (-2.542949192, 15.411181402), (-3.275, 14.679130594))
            Line((-3.275, 14.679130594), (-5.962564435, 13.127464544))
            ThreePointArc((-5.962564435, 13.127464544), (-6.0557496, 13.006023273), (-6.035769515, 12.854259464))
            Line((-6.035769515, 12.854259464), (-5.724644145, 12.315374514))
            ThreePointArc((-5.724644145, 12.315374514), (-5.613090664, 12.225113955), (-5.469800254, 12.232795477))
            ThreePointArc((-5.469800254, 12.232795477), (0, 13.4), (5.469800254, 12.232795477))
            ThreePointArc((5.469800254, 12.232795477), (5.613090664, 12.225113955), (5.724644145, 12.315374514))
            Line((5.724644145, 12.315374514), (6.035769515, 12.854259464))
            ThreePointArc((6.035769515, 12.854259464), (6.0557496, 13.006023273), (5.962564435, 13.127464544))
        make_face(mode=Mode.SUBTRACT)
    extrude(amount=Y_KSEKLIK_EKSTR_ZYON1_DEPTH)


solid = part.part
